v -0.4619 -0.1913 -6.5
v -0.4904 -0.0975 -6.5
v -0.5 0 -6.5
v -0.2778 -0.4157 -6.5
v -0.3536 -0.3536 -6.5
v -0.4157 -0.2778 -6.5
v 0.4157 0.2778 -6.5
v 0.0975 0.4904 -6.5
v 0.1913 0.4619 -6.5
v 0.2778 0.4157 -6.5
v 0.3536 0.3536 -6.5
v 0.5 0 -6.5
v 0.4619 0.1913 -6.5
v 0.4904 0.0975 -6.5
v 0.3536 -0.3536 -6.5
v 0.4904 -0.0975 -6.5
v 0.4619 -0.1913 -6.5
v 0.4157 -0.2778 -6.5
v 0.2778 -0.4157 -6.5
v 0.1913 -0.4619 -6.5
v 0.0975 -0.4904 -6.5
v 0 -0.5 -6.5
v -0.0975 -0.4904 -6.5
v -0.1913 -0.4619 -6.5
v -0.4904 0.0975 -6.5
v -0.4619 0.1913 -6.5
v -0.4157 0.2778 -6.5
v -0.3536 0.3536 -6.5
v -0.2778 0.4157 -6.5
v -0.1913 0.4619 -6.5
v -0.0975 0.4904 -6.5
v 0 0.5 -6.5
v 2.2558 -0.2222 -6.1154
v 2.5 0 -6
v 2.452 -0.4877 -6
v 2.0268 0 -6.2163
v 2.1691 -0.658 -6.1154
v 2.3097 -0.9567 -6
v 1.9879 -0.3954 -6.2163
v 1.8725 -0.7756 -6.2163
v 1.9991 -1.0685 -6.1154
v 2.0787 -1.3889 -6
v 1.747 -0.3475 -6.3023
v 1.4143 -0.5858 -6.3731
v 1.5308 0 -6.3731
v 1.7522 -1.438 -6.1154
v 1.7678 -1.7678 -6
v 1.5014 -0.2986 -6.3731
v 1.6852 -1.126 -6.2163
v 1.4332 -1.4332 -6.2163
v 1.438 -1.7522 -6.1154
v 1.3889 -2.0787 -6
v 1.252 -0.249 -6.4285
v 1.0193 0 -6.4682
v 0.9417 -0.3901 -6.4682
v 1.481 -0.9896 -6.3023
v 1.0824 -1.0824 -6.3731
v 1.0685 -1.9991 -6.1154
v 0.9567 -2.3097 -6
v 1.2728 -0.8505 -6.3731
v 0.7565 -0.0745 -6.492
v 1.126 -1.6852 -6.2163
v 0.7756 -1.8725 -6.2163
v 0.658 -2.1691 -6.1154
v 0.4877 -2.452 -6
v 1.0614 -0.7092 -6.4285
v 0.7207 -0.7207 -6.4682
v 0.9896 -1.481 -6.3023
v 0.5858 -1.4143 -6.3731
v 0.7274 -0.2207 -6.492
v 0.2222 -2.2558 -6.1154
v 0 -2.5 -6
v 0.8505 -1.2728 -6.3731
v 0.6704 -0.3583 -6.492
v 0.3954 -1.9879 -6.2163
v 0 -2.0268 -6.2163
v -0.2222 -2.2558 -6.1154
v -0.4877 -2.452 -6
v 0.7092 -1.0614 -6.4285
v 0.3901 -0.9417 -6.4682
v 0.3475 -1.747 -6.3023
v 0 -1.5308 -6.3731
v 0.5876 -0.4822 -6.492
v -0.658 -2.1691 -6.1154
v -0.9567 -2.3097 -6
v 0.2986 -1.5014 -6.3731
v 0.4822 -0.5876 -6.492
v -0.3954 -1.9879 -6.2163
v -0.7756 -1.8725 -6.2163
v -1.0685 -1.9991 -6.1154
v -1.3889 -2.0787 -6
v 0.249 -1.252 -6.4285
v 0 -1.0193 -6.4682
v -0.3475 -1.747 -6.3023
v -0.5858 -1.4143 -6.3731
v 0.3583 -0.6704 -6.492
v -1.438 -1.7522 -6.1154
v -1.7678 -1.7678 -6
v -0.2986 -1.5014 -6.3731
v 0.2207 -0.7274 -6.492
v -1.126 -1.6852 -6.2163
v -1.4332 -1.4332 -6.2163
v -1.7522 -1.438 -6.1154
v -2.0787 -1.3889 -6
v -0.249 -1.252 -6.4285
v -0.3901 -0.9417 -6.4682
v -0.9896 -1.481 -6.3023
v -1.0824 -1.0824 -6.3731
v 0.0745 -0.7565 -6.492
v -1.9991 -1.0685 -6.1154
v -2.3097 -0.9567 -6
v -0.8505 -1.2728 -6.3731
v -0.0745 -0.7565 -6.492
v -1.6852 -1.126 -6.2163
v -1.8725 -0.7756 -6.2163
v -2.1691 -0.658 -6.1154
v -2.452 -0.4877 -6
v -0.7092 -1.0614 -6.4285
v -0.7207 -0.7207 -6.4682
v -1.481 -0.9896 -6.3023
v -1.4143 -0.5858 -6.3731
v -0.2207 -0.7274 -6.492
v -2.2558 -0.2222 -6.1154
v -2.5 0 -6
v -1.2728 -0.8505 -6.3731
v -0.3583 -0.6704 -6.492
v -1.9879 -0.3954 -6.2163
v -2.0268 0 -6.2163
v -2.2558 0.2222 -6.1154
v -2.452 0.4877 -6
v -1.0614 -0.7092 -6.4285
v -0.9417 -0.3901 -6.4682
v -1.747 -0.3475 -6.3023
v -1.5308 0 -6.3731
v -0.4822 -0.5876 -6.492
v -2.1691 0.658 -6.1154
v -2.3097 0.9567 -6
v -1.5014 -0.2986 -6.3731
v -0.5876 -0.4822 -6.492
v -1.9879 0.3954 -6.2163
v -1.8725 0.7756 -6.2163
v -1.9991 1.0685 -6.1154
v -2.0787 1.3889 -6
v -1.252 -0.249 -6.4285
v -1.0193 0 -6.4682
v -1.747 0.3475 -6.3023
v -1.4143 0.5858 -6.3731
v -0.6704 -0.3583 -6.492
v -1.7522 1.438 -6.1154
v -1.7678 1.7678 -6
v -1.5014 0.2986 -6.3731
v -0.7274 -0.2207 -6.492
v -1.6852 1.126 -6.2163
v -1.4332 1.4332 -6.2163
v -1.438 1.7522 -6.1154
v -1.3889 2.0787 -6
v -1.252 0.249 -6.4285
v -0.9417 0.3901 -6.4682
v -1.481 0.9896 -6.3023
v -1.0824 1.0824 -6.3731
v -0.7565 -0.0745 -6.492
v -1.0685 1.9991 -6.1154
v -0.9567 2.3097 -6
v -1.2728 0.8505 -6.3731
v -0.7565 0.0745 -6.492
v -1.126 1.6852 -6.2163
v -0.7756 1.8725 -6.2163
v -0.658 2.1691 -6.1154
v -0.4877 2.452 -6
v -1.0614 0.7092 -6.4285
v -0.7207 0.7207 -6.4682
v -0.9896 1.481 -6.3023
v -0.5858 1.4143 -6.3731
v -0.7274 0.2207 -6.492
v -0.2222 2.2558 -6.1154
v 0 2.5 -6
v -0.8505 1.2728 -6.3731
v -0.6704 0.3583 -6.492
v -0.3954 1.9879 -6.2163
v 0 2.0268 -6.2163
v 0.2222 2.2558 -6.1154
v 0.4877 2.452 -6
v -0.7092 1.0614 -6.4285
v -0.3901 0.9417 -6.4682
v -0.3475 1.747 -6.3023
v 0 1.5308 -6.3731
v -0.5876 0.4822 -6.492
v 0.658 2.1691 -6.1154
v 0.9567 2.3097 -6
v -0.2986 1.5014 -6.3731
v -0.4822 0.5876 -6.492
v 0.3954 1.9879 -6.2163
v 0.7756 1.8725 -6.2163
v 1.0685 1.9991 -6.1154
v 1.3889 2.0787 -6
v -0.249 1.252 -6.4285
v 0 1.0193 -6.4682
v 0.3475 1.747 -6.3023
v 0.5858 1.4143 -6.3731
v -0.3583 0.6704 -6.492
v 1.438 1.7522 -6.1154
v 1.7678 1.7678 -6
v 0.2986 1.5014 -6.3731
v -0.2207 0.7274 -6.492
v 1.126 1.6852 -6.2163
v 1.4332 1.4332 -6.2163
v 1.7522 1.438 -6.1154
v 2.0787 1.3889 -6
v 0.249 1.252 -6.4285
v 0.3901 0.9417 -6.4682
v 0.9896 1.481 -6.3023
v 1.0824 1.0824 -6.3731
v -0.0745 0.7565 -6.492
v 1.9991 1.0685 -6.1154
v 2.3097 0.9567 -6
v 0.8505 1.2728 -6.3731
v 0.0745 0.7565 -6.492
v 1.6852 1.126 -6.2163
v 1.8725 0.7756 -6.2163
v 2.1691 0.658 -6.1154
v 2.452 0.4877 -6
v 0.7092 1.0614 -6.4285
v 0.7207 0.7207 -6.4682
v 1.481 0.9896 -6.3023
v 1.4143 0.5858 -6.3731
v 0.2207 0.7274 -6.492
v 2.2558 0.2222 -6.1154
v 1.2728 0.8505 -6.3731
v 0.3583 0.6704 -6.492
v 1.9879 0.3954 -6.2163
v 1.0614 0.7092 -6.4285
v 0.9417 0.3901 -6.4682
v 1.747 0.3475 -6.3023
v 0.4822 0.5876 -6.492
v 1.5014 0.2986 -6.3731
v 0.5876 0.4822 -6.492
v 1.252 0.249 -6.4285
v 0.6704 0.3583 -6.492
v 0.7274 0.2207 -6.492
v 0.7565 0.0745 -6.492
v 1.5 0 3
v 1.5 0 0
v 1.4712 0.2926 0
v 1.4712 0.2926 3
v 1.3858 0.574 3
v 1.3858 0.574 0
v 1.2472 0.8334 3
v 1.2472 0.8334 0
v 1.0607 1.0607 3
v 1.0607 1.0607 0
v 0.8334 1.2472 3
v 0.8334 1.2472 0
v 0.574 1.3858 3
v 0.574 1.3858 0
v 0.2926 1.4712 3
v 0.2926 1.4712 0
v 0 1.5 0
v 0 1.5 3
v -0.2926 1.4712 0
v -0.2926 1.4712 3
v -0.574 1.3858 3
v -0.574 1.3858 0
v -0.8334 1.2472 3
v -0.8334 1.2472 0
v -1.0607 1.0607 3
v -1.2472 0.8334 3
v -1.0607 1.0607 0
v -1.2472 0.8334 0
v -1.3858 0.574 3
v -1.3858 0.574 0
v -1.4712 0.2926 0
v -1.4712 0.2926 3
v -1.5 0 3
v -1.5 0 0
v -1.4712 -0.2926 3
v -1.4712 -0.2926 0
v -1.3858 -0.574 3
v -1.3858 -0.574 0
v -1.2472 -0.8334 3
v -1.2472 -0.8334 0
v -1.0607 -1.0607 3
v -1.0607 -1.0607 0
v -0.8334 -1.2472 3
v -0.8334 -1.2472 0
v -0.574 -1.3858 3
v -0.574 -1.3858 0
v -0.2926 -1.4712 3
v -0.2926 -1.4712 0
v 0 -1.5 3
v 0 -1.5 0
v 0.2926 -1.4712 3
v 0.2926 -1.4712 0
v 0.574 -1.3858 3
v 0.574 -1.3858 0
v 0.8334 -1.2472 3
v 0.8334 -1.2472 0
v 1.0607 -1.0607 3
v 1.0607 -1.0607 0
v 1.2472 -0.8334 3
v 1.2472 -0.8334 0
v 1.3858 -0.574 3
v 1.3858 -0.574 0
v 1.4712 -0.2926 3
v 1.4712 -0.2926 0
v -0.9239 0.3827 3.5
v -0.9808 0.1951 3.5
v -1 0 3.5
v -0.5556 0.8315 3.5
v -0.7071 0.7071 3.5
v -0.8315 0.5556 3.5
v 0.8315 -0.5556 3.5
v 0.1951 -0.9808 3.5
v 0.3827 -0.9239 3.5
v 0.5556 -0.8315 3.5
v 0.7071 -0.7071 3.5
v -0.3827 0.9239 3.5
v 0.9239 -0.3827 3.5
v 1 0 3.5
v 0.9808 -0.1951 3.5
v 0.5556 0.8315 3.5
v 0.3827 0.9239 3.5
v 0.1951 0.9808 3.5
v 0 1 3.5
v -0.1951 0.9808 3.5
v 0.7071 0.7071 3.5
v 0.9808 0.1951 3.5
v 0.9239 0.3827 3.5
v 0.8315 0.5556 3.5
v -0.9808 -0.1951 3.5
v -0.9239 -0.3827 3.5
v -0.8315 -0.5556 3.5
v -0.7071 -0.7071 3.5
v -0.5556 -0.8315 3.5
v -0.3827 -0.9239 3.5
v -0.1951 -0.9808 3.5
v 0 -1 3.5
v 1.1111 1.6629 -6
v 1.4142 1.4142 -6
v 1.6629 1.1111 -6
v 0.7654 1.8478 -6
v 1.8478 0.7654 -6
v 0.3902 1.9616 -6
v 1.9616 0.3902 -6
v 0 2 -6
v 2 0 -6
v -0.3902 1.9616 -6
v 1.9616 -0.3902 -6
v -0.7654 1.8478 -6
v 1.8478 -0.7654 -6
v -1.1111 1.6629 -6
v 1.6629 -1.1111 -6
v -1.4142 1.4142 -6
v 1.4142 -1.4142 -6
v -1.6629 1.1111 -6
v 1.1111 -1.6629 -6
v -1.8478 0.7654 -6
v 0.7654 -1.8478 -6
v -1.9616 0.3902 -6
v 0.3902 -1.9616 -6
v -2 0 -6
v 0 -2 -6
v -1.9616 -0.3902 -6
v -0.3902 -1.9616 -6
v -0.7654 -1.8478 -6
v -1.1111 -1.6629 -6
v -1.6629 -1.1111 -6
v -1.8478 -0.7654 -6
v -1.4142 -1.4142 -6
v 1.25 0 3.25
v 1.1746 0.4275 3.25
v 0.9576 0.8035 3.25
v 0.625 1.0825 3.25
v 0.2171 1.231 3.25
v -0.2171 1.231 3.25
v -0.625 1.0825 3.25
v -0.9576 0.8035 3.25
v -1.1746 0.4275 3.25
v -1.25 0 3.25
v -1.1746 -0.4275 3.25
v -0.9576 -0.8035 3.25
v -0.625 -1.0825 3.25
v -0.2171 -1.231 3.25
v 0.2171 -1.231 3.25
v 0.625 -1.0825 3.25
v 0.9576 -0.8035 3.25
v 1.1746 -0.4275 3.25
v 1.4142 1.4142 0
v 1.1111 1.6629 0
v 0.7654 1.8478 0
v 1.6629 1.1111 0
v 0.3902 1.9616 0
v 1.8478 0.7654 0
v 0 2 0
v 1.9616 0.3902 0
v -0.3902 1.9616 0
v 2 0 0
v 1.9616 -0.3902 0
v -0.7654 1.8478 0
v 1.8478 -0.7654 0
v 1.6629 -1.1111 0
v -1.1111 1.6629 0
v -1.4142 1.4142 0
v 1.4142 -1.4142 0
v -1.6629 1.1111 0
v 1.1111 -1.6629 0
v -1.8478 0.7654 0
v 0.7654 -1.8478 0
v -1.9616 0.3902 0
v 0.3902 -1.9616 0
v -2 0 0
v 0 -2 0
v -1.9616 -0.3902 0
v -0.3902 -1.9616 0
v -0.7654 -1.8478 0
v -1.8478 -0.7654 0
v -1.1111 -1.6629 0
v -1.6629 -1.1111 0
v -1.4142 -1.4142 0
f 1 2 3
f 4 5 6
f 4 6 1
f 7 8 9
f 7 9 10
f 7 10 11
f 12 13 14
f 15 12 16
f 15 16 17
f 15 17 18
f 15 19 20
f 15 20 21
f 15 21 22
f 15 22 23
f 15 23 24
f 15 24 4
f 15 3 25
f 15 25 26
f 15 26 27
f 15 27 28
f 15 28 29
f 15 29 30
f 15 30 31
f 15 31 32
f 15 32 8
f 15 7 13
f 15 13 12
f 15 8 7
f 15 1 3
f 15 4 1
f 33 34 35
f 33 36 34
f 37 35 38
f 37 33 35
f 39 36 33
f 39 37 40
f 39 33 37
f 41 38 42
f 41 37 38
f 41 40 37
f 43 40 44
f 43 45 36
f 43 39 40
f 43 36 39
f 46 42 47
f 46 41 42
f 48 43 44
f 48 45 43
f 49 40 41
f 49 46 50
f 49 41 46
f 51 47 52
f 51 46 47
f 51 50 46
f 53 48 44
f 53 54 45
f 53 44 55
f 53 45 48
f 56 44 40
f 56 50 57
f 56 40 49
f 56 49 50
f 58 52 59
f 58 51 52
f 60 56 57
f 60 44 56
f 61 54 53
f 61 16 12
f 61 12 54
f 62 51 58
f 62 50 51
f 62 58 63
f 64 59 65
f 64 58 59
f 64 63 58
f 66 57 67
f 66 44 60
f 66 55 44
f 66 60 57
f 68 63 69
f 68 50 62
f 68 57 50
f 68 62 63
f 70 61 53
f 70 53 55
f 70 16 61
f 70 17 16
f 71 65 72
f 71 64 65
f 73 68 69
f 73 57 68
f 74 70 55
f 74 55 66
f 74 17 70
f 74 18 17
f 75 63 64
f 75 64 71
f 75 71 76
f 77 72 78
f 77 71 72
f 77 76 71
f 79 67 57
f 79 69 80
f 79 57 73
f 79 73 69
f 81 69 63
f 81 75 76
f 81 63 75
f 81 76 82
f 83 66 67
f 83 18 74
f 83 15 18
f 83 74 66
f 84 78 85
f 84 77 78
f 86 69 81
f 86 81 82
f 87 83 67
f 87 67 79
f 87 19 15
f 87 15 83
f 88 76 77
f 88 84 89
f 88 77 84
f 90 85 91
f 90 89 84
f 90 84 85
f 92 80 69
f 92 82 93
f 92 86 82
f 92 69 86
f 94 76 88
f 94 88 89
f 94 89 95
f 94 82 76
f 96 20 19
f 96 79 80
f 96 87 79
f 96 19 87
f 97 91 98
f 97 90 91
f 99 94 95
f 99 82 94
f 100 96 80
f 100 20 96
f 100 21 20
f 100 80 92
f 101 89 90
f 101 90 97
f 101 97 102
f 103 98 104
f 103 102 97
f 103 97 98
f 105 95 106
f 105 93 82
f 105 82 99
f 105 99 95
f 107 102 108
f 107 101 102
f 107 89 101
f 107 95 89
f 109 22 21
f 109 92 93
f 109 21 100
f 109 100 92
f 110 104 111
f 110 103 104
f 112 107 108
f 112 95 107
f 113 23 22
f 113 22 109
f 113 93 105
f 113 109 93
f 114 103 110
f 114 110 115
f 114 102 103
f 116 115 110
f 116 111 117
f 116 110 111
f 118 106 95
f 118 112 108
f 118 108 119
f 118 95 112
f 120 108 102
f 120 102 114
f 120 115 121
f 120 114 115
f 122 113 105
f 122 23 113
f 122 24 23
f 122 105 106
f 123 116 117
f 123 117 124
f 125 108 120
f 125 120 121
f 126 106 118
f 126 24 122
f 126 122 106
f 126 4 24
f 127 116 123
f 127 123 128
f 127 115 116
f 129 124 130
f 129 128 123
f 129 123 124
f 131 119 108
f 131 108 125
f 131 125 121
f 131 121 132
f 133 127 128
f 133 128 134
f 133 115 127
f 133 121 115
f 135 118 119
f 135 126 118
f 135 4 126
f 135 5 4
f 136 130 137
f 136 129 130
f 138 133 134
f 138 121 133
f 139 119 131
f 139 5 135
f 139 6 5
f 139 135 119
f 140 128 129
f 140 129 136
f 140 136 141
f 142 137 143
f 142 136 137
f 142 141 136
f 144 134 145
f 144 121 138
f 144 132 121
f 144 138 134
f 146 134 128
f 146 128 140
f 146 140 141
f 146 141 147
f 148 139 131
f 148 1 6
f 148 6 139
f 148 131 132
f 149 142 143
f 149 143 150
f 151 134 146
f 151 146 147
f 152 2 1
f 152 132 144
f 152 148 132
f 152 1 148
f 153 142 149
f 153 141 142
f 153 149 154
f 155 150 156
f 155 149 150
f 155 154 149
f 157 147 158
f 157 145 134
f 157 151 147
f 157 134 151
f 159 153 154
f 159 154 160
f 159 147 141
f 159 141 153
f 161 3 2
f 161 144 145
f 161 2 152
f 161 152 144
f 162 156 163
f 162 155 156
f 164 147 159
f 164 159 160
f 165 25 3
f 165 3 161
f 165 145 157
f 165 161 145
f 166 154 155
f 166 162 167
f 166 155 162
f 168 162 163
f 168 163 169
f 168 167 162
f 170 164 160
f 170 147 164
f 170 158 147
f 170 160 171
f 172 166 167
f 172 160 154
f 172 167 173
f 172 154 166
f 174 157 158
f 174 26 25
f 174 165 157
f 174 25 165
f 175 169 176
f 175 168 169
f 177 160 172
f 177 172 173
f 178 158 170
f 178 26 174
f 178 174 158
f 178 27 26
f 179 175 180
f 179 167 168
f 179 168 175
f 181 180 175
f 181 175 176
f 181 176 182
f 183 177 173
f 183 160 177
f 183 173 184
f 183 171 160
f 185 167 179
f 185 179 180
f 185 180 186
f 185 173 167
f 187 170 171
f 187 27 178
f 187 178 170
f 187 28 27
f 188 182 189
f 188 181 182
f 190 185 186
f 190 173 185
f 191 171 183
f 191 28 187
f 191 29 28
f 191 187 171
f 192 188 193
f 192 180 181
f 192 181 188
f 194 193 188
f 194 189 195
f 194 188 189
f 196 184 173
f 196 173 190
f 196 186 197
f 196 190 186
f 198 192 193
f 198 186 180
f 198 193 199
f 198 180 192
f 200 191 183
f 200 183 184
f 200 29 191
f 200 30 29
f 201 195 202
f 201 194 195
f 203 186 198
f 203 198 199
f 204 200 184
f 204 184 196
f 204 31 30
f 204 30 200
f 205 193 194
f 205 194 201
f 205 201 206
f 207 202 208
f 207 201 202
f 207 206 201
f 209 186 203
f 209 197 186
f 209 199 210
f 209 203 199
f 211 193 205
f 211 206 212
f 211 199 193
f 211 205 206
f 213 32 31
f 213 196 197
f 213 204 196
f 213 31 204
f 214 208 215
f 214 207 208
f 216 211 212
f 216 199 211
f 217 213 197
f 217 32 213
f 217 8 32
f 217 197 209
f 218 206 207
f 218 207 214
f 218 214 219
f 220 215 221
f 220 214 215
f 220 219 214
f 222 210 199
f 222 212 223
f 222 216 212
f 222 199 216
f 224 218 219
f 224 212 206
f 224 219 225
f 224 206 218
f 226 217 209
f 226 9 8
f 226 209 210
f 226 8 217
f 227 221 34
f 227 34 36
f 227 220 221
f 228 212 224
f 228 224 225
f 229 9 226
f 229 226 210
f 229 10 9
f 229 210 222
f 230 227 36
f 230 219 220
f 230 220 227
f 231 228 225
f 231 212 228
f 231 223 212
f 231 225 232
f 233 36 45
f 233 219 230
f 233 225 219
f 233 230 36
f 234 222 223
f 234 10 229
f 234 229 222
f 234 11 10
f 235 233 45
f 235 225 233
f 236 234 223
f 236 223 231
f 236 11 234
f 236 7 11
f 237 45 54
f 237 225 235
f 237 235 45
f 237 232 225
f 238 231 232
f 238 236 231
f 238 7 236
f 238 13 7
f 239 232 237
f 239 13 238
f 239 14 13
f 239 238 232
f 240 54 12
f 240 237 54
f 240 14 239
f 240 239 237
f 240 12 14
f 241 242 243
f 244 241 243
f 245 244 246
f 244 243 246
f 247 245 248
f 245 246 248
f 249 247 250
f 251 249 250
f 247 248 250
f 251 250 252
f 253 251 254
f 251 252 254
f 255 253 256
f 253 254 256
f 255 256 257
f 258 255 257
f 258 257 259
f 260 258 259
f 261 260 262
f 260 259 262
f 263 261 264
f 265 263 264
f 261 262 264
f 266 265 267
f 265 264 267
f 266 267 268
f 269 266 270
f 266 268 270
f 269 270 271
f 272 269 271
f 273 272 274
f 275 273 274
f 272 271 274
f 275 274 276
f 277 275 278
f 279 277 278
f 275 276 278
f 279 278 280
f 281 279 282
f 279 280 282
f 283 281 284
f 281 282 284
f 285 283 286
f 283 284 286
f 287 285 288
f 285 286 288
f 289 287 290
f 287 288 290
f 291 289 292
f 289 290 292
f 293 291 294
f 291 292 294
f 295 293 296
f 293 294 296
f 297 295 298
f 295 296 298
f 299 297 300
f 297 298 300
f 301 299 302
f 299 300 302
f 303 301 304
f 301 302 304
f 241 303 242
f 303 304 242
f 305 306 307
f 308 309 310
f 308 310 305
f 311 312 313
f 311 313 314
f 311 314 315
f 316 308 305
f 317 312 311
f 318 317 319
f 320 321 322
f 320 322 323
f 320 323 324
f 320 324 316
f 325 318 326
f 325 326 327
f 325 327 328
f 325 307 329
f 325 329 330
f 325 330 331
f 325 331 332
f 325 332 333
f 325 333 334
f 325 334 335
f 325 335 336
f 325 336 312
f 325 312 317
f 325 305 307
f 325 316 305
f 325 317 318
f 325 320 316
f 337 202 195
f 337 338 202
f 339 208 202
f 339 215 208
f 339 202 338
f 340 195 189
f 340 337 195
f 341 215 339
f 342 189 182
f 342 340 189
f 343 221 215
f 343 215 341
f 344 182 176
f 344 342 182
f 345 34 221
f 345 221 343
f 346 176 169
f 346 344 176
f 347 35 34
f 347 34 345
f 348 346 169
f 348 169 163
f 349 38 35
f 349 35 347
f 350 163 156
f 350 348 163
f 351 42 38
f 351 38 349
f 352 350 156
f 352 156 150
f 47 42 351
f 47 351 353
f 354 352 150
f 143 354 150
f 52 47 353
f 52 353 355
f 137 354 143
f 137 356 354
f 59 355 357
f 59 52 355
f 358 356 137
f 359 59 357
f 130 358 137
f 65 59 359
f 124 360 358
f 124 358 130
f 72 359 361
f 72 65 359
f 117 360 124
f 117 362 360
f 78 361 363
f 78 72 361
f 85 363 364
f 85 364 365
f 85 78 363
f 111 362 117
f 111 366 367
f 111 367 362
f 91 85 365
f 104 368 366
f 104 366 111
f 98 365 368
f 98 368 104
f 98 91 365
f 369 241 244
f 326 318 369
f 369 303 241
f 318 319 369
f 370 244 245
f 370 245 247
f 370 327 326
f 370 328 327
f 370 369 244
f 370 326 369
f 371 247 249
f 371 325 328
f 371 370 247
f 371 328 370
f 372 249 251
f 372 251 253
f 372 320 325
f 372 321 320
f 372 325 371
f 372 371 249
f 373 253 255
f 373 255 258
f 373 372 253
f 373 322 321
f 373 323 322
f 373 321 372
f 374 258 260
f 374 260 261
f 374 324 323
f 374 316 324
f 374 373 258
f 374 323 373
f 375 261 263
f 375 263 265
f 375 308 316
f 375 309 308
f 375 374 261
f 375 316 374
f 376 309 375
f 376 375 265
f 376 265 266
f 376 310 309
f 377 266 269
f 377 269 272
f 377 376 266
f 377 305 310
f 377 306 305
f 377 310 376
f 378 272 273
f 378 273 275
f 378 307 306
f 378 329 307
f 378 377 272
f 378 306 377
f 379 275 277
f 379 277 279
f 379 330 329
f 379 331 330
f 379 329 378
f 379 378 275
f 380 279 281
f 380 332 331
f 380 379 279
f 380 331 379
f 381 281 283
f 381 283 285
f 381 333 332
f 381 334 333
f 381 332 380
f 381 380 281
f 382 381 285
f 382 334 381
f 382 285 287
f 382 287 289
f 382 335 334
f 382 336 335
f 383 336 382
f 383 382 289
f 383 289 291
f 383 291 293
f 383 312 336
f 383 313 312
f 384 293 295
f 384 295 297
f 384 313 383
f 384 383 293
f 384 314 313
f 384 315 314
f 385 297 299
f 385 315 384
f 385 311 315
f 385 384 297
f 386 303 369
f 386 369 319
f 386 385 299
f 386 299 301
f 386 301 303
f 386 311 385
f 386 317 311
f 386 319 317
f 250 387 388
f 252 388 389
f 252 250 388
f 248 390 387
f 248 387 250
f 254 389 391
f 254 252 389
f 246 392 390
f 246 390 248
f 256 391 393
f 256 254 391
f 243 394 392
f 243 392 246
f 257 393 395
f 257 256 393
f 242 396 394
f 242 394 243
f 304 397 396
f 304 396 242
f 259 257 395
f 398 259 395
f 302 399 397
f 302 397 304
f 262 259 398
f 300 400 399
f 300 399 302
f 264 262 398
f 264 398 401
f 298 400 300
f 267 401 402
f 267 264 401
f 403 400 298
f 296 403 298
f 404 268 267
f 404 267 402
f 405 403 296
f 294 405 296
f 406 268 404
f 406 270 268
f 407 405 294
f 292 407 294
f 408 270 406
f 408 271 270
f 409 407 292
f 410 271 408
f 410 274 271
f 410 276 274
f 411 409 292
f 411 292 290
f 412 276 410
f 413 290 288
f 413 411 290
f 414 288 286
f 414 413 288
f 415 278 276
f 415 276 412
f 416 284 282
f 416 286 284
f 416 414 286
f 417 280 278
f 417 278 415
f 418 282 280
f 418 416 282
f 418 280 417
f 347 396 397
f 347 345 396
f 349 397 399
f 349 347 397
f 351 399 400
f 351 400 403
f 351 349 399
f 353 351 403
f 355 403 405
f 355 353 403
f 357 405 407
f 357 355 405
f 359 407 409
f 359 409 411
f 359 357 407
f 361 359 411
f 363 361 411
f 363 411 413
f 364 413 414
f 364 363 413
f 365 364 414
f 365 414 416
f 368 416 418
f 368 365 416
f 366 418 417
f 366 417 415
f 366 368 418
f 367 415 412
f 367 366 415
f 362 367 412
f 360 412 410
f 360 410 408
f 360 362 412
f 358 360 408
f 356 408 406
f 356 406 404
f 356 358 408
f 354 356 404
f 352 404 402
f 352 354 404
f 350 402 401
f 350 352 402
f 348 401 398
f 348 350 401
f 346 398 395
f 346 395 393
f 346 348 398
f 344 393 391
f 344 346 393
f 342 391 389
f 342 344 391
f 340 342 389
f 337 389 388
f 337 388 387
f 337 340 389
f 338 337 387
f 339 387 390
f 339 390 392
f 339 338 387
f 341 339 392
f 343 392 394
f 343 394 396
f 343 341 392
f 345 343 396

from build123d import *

# Parameters (mm, degrees)
SKETCH2_R           = 1.5
BOSS_EXTRUDE1_DEPTH = 3.5
CHAMFER1_SIZE       = 0.5


with BuildPart() as part:
    # Sketch1 → Revolve1 (revolve)
    with BuildSketch(Plane(origin=(0, 0, 0), x_dir=(1, 0, 0), z_dir=(0, 1, 0)), mode=Mode.PRIVATE) as revolve1_sk:
        with BuildLine():
            Line((0, 0), (-2, 0))
            Line((-2, 0), (-2, 6))
            Line((-2, 6), (-2.5, 6))
            ThreePointArc((-2.5, 6), (-1.530776406, 6.373105626), (-0.5, 6.5))
            Line((-0.5, 6.5), (0, 6.5))
            Line((0, 6.5), (0, 0))
        make_face()
    revolve(revolve1_sk.sketch.rotate(Axis((0, 0, 0), (0, 0, -1)), 180), axis=Axis((0, 0, 0), (0, 0, -1)))

    # Sketch2 → Boss-Extrude1 (add)
    with BuildSketch(Plane.XY):
        Circle(SKETCH2_R)
    extrude(amount=BOSS_EXTRUDE1_DEPTH)

    # Chamfer1
    chamfer1_edges = [part.edges().sort_by_distance(p)[0] for p in [
        (-1.5, 0, 3.5),
    ]]
    chamfer(chamfer1_edges, length=CHAMFER1_SIZE)


solid = part.part
